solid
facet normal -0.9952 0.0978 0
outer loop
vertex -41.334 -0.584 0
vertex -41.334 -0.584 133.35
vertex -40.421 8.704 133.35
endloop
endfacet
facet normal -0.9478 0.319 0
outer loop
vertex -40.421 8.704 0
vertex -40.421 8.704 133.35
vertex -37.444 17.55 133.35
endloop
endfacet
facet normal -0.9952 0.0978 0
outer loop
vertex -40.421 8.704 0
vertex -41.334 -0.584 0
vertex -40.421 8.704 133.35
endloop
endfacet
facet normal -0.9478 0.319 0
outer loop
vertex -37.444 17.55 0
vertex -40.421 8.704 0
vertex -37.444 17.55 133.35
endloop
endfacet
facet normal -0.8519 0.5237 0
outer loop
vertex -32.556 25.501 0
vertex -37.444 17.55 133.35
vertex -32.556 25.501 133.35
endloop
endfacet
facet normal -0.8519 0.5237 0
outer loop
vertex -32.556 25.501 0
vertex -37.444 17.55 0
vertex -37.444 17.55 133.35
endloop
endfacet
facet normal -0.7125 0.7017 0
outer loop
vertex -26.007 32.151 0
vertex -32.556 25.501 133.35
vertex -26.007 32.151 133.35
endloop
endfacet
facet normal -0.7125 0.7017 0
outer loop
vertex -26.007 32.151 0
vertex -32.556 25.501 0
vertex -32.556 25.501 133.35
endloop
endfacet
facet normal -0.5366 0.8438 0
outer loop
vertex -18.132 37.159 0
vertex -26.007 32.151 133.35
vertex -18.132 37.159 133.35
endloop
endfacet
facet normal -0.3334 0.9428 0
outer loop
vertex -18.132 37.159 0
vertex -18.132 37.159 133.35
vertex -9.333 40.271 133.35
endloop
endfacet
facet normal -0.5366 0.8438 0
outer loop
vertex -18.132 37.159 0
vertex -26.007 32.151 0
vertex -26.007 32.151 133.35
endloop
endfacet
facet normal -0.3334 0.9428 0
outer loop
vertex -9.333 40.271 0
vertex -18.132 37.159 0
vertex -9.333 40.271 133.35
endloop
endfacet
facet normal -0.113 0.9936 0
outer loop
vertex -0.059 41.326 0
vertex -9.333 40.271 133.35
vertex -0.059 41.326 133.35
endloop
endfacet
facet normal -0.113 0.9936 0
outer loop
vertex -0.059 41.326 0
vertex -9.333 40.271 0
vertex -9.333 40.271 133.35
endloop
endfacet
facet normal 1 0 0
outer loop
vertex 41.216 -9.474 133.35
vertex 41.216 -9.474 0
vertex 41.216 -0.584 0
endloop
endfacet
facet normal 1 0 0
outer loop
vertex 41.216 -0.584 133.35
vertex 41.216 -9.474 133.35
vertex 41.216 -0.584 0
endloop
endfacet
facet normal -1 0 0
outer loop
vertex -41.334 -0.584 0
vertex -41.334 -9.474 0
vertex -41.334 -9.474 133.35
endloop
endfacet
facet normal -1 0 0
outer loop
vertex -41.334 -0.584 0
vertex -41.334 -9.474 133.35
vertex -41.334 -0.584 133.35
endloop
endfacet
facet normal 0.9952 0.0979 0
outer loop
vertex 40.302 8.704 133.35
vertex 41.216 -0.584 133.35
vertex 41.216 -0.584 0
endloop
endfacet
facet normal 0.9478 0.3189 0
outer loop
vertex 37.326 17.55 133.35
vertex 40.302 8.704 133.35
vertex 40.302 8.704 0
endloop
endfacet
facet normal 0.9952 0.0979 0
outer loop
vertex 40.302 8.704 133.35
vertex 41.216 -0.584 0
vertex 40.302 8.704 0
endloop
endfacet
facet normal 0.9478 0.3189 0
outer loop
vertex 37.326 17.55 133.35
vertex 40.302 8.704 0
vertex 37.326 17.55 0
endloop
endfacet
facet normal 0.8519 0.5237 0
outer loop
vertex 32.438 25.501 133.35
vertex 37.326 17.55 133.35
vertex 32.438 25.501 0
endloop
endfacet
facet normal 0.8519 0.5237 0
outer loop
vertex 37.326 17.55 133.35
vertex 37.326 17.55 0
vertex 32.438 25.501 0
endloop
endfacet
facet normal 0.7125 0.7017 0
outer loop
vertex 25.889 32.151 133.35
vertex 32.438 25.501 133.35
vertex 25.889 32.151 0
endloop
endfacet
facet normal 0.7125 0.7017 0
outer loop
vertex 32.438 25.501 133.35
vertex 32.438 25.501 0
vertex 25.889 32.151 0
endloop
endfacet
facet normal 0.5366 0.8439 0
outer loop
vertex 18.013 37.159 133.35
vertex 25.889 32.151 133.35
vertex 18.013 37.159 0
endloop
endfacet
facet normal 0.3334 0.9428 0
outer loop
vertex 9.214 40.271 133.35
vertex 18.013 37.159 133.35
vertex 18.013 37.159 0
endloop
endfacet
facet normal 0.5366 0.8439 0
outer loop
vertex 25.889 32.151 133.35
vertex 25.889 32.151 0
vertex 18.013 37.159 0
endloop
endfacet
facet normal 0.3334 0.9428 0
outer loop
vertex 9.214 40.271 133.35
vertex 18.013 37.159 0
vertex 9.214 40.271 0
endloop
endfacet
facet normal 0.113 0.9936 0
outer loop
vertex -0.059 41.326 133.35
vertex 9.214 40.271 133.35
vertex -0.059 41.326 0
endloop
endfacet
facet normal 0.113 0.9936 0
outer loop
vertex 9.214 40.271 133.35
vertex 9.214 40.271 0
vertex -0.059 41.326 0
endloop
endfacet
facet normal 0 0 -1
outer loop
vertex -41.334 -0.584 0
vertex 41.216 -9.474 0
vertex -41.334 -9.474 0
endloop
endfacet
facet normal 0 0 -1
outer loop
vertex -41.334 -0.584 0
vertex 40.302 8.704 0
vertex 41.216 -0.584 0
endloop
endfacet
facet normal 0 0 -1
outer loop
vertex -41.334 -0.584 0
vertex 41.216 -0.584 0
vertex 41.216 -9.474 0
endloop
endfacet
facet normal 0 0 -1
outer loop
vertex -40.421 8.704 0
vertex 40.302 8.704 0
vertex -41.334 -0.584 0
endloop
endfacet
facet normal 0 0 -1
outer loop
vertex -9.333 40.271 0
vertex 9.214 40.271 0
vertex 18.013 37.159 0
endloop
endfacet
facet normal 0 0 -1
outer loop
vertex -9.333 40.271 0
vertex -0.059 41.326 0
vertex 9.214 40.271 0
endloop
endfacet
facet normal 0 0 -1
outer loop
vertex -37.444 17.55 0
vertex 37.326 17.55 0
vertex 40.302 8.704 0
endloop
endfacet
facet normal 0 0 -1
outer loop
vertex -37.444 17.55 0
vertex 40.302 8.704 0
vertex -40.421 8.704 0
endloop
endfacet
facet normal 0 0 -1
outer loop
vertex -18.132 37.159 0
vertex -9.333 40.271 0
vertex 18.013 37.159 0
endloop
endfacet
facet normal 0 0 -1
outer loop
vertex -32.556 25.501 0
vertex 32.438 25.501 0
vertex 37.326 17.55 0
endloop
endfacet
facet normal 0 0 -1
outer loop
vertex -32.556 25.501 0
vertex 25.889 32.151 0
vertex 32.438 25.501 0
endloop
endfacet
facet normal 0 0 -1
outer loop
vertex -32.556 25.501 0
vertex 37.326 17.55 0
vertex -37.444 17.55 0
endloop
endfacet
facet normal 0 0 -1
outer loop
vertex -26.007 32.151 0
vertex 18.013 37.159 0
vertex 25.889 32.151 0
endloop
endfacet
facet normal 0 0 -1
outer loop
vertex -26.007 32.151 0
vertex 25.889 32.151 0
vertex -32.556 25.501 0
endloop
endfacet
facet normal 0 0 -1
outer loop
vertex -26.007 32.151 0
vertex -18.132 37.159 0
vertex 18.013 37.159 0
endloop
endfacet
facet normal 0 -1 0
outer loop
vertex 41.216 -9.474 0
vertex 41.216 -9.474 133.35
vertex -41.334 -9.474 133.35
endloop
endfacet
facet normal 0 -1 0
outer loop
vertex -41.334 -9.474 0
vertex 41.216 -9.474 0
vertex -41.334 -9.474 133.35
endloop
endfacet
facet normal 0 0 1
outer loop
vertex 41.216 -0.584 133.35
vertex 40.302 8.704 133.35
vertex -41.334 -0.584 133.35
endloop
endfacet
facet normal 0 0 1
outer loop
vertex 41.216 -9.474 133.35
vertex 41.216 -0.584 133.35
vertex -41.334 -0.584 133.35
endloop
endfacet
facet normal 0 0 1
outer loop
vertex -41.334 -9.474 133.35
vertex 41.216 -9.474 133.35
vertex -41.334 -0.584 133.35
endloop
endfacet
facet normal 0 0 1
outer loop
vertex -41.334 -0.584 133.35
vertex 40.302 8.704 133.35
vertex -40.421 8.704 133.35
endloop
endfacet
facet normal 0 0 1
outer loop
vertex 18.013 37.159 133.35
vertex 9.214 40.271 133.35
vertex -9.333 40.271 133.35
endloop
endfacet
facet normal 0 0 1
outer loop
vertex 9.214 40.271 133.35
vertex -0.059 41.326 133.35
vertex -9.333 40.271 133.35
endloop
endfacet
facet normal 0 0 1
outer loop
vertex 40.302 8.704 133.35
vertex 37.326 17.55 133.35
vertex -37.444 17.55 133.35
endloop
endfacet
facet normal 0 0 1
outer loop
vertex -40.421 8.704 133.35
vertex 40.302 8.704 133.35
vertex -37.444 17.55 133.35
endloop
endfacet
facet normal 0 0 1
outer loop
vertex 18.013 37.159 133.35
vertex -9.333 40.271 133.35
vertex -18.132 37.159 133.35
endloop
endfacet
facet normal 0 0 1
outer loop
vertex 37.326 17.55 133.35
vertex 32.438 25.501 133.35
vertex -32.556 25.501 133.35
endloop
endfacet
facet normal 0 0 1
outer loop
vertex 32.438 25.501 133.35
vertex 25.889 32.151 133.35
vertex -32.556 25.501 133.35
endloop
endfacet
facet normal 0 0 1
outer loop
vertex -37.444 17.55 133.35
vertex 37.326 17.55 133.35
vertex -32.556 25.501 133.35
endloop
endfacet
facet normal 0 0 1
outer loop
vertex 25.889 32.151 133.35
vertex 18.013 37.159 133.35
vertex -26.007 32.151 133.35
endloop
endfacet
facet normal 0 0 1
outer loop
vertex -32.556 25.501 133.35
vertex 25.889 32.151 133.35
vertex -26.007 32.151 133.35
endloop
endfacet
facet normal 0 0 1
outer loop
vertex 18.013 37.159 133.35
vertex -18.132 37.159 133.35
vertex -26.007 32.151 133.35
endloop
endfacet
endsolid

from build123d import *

# Parameters (mm, degrees)
F1_DEPTH = 133.35


with BuildPart() as f1:
    # F0 (on Top) → F1 (new body)
    with BuildSketch(Plane.XY):
        with BuildLine():
            Line((-0.059343, 41.325617), (-0.059343, -9.474383))
            Line((-0.059343, -9.474383), (41.215657, -9.474383))
            Line((41.215657, -9.474383), (41.215657, -0.584383))
            ThreePointArc((41.215657, -0.584383), (29.351853, 29.011377), (-0.059343, 41.325617))
        make_face()
    extrude(amount=F1_DEPTH)

    # F2: F1 across face


with BuildPart() as f1_1:
    add(f1.part)
    add(f1.part.mirror(Plane(origin=(-0.059343, 15.925617, 66.675), x_dir=(0, -1, 0), z_dir=(-1, 0, 0))))


solid = f1_1.part
